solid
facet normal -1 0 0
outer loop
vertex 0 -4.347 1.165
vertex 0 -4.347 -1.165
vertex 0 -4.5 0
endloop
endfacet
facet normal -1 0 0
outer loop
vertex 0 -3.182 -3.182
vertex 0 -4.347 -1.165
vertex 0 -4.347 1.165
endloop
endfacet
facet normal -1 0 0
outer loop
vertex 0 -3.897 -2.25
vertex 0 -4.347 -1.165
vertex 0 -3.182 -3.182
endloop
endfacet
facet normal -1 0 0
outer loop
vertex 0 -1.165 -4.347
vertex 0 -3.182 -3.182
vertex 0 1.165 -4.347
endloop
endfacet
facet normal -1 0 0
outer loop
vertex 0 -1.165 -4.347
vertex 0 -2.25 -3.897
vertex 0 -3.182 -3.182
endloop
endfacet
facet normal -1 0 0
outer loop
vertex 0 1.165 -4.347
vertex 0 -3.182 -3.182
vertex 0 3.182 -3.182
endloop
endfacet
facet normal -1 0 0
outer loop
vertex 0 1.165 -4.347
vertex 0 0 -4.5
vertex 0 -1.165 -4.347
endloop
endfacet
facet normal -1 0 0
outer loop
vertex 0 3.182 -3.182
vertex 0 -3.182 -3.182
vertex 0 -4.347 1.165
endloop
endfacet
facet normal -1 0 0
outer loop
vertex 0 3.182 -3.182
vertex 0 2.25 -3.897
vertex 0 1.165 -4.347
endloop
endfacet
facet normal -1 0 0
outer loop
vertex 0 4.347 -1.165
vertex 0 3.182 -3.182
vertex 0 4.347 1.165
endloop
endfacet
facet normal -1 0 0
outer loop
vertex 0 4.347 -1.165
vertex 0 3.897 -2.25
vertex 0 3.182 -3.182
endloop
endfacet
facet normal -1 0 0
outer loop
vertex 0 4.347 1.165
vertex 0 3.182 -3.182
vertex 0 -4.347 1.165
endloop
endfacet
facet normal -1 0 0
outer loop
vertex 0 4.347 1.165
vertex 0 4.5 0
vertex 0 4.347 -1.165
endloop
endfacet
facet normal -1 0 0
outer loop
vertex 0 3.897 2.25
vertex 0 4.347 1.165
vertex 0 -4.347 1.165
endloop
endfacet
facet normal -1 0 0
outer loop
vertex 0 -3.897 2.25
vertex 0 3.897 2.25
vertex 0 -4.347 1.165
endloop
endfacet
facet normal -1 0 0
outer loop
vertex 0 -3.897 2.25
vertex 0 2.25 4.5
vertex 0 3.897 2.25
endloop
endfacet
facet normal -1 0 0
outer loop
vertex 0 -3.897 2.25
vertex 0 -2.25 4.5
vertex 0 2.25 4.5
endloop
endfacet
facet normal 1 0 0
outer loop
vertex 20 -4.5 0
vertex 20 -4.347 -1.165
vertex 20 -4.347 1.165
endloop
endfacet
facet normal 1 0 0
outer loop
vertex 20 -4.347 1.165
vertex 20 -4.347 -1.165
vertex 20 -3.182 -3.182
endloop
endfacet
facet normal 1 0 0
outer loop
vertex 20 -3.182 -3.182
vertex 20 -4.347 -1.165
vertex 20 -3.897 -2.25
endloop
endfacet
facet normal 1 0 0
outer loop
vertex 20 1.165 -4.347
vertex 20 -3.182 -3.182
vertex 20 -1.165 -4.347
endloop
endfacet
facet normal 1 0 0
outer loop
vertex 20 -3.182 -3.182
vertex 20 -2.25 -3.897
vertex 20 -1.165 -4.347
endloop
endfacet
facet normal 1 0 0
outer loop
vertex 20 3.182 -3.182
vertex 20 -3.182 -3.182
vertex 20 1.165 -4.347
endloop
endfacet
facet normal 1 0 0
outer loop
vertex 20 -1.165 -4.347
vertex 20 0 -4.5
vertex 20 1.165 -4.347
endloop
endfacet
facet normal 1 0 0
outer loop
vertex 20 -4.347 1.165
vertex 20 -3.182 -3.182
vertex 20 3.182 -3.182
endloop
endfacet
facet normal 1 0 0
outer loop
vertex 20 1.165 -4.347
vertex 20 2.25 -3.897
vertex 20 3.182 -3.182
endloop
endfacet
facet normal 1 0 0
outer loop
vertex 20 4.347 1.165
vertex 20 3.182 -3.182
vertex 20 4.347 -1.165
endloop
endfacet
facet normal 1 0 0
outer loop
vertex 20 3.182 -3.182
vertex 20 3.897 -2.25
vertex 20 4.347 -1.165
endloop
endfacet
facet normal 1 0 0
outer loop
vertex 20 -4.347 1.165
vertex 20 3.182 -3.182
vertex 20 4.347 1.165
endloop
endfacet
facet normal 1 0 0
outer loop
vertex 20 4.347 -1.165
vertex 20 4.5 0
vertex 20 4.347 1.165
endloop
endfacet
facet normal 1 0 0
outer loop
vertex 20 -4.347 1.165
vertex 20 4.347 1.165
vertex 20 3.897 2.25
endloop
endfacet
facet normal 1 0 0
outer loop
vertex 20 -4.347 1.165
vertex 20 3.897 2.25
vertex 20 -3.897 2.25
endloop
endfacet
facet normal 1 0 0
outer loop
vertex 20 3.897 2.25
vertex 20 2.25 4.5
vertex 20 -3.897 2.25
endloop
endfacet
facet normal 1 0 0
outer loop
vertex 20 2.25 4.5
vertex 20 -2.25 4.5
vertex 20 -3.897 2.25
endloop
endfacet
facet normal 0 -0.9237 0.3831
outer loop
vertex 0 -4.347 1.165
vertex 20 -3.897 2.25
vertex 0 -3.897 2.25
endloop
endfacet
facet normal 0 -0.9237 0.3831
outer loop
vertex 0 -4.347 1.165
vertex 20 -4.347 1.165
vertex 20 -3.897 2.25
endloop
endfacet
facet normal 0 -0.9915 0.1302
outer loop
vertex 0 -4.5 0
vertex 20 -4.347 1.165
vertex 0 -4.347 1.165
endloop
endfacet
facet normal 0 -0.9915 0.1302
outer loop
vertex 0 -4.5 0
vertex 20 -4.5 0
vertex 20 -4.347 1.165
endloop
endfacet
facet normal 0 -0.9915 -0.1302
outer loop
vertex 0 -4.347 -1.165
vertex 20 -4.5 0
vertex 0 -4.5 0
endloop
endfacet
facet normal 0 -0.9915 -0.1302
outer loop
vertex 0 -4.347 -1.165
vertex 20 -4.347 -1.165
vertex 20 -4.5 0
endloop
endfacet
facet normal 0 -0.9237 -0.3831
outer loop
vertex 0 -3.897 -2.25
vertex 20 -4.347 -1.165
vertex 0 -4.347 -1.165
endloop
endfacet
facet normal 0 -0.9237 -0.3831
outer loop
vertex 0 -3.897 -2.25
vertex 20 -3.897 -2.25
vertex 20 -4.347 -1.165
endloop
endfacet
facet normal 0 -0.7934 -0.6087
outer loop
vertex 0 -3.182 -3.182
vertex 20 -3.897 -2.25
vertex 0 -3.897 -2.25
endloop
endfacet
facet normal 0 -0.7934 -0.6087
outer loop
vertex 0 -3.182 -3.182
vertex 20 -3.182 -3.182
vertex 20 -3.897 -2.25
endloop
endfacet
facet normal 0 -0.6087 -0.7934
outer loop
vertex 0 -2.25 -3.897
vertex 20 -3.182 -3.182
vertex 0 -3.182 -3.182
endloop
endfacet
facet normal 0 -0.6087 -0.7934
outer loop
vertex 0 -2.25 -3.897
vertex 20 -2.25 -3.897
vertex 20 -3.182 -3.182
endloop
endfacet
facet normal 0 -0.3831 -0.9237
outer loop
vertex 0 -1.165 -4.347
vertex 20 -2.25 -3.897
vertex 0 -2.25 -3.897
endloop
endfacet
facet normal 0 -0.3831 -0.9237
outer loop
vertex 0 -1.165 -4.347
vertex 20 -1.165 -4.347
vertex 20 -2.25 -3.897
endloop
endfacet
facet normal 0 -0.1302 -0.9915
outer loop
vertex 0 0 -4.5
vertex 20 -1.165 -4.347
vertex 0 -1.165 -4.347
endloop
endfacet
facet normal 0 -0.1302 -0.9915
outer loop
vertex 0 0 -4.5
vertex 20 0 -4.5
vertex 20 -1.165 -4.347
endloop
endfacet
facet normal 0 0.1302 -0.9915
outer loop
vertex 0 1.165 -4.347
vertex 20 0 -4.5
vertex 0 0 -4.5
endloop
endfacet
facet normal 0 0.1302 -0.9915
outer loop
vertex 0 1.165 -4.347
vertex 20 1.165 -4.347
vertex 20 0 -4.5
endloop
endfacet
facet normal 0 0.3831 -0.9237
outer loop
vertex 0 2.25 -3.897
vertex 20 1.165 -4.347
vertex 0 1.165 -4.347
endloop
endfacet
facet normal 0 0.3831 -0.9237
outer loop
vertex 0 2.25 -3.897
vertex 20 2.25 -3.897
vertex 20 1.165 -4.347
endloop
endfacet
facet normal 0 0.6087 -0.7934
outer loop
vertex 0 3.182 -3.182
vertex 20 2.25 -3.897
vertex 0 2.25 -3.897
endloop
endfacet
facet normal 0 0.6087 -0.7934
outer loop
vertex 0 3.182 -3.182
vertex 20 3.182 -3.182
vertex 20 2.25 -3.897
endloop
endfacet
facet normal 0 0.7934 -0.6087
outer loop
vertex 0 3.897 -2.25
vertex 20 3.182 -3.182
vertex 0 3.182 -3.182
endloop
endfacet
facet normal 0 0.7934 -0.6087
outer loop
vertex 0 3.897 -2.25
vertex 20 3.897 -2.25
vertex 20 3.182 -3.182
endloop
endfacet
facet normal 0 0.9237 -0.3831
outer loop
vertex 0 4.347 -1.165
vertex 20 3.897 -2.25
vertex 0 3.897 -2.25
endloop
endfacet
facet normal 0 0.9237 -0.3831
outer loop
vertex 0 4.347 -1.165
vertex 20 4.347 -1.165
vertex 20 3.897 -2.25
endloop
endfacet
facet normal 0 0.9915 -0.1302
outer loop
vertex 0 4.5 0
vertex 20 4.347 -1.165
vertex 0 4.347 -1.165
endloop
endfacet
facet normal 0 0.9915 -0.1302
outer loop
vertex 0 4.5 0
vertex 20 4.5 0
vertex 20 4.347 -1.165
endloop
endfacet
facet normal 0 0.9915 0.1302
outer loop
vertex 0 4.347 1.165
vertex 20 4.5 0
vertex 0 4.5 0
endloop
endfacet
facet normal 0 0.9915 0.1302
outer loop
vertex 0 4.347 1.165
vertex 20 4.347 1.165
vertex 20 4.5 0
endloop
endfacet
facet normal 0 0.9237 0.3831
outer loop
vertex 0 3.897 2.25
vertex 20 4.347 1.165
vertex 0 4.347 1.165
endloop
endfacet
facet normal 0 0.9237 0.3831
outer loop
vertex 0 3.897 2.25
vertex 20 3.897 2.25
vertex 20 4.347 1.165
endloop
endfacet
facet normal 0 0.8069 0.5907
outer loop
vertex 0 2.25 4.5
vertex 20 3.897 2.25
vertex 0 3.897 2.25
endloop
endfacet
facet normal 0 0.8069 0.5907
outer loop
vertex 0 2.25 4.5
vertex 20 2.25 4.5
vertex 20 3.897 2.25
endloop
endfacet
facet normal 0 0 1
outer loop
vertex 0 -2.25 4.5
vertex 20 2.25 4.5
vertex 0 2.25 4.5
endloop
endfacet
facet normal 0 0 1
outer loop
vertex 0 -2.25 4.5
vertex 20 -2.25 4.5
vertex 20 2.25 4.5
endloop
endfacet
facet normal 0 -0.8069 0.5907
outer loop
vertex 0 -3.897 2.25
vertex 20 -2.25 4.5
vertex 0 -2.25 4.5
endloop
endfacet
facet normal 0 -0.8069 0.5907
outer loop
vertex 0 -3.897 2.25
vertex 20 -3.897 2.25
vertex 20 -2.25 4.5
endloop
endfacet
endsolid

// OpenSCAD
teardrop();

module teardrop (r=4.5,h=20,top_and_bottom=false)
{
	rotate([-270,0,90])
	linear_extrude(height=h,convexity=10)
	{
		circle(r=r, $fn = 24);
		polygon(points=[[0,0],[r*cos(30),r*sin(30)],[0.5*r,r],[-0.5*r,r],[-r*cos(30),r*sin(30)]],
				paths=[[0,1,2,3,4]]);
		if (top_and_bottom)
		polygon(points=[[0,0],[r*cos(30),-r*sin(30)],[0.5*r,-r],[-0.5*r,-r],[-r*cos(30),-r*sin(30)]],
				paths=[[0,1,2,3,4]]);
		
	}
}

module teardropcentering (r=4.5,h=20)
{
	rotate([-270,0,90])
	linear_extrude(height=h)
	{
		circle(r=r, $fn = 24);
		polygon(points=[[0,0],[r*cos(30),r*sin(30)],[0.5*r,1.2*r],[-0.5*r,1.2*r],[-r*cos(30),r*sin(30)]],
				paths=[[0,1,2,3,4]]);
	}
}

module teardropcentering2 (r=4.5,h=20)
{
	//rotate([-270,0,90])
	difference(){
	linear_extrude(height=h)
	{
		circle(r=r, $fn = 24);
		polygon(points=[[0,0],[r*cos(30),r*sin(30)],[0.5*r,1.2*r],[-0.5*r,1.2*r],[-r*cos(30),r*sin(30)]],
				paths=[[0,1,2,3,4]]);
	}
	translate(v = [-1.5*r, -1.5*r,-1])cube(size =[3*r,1.5*r,h+2]);
	}
}
